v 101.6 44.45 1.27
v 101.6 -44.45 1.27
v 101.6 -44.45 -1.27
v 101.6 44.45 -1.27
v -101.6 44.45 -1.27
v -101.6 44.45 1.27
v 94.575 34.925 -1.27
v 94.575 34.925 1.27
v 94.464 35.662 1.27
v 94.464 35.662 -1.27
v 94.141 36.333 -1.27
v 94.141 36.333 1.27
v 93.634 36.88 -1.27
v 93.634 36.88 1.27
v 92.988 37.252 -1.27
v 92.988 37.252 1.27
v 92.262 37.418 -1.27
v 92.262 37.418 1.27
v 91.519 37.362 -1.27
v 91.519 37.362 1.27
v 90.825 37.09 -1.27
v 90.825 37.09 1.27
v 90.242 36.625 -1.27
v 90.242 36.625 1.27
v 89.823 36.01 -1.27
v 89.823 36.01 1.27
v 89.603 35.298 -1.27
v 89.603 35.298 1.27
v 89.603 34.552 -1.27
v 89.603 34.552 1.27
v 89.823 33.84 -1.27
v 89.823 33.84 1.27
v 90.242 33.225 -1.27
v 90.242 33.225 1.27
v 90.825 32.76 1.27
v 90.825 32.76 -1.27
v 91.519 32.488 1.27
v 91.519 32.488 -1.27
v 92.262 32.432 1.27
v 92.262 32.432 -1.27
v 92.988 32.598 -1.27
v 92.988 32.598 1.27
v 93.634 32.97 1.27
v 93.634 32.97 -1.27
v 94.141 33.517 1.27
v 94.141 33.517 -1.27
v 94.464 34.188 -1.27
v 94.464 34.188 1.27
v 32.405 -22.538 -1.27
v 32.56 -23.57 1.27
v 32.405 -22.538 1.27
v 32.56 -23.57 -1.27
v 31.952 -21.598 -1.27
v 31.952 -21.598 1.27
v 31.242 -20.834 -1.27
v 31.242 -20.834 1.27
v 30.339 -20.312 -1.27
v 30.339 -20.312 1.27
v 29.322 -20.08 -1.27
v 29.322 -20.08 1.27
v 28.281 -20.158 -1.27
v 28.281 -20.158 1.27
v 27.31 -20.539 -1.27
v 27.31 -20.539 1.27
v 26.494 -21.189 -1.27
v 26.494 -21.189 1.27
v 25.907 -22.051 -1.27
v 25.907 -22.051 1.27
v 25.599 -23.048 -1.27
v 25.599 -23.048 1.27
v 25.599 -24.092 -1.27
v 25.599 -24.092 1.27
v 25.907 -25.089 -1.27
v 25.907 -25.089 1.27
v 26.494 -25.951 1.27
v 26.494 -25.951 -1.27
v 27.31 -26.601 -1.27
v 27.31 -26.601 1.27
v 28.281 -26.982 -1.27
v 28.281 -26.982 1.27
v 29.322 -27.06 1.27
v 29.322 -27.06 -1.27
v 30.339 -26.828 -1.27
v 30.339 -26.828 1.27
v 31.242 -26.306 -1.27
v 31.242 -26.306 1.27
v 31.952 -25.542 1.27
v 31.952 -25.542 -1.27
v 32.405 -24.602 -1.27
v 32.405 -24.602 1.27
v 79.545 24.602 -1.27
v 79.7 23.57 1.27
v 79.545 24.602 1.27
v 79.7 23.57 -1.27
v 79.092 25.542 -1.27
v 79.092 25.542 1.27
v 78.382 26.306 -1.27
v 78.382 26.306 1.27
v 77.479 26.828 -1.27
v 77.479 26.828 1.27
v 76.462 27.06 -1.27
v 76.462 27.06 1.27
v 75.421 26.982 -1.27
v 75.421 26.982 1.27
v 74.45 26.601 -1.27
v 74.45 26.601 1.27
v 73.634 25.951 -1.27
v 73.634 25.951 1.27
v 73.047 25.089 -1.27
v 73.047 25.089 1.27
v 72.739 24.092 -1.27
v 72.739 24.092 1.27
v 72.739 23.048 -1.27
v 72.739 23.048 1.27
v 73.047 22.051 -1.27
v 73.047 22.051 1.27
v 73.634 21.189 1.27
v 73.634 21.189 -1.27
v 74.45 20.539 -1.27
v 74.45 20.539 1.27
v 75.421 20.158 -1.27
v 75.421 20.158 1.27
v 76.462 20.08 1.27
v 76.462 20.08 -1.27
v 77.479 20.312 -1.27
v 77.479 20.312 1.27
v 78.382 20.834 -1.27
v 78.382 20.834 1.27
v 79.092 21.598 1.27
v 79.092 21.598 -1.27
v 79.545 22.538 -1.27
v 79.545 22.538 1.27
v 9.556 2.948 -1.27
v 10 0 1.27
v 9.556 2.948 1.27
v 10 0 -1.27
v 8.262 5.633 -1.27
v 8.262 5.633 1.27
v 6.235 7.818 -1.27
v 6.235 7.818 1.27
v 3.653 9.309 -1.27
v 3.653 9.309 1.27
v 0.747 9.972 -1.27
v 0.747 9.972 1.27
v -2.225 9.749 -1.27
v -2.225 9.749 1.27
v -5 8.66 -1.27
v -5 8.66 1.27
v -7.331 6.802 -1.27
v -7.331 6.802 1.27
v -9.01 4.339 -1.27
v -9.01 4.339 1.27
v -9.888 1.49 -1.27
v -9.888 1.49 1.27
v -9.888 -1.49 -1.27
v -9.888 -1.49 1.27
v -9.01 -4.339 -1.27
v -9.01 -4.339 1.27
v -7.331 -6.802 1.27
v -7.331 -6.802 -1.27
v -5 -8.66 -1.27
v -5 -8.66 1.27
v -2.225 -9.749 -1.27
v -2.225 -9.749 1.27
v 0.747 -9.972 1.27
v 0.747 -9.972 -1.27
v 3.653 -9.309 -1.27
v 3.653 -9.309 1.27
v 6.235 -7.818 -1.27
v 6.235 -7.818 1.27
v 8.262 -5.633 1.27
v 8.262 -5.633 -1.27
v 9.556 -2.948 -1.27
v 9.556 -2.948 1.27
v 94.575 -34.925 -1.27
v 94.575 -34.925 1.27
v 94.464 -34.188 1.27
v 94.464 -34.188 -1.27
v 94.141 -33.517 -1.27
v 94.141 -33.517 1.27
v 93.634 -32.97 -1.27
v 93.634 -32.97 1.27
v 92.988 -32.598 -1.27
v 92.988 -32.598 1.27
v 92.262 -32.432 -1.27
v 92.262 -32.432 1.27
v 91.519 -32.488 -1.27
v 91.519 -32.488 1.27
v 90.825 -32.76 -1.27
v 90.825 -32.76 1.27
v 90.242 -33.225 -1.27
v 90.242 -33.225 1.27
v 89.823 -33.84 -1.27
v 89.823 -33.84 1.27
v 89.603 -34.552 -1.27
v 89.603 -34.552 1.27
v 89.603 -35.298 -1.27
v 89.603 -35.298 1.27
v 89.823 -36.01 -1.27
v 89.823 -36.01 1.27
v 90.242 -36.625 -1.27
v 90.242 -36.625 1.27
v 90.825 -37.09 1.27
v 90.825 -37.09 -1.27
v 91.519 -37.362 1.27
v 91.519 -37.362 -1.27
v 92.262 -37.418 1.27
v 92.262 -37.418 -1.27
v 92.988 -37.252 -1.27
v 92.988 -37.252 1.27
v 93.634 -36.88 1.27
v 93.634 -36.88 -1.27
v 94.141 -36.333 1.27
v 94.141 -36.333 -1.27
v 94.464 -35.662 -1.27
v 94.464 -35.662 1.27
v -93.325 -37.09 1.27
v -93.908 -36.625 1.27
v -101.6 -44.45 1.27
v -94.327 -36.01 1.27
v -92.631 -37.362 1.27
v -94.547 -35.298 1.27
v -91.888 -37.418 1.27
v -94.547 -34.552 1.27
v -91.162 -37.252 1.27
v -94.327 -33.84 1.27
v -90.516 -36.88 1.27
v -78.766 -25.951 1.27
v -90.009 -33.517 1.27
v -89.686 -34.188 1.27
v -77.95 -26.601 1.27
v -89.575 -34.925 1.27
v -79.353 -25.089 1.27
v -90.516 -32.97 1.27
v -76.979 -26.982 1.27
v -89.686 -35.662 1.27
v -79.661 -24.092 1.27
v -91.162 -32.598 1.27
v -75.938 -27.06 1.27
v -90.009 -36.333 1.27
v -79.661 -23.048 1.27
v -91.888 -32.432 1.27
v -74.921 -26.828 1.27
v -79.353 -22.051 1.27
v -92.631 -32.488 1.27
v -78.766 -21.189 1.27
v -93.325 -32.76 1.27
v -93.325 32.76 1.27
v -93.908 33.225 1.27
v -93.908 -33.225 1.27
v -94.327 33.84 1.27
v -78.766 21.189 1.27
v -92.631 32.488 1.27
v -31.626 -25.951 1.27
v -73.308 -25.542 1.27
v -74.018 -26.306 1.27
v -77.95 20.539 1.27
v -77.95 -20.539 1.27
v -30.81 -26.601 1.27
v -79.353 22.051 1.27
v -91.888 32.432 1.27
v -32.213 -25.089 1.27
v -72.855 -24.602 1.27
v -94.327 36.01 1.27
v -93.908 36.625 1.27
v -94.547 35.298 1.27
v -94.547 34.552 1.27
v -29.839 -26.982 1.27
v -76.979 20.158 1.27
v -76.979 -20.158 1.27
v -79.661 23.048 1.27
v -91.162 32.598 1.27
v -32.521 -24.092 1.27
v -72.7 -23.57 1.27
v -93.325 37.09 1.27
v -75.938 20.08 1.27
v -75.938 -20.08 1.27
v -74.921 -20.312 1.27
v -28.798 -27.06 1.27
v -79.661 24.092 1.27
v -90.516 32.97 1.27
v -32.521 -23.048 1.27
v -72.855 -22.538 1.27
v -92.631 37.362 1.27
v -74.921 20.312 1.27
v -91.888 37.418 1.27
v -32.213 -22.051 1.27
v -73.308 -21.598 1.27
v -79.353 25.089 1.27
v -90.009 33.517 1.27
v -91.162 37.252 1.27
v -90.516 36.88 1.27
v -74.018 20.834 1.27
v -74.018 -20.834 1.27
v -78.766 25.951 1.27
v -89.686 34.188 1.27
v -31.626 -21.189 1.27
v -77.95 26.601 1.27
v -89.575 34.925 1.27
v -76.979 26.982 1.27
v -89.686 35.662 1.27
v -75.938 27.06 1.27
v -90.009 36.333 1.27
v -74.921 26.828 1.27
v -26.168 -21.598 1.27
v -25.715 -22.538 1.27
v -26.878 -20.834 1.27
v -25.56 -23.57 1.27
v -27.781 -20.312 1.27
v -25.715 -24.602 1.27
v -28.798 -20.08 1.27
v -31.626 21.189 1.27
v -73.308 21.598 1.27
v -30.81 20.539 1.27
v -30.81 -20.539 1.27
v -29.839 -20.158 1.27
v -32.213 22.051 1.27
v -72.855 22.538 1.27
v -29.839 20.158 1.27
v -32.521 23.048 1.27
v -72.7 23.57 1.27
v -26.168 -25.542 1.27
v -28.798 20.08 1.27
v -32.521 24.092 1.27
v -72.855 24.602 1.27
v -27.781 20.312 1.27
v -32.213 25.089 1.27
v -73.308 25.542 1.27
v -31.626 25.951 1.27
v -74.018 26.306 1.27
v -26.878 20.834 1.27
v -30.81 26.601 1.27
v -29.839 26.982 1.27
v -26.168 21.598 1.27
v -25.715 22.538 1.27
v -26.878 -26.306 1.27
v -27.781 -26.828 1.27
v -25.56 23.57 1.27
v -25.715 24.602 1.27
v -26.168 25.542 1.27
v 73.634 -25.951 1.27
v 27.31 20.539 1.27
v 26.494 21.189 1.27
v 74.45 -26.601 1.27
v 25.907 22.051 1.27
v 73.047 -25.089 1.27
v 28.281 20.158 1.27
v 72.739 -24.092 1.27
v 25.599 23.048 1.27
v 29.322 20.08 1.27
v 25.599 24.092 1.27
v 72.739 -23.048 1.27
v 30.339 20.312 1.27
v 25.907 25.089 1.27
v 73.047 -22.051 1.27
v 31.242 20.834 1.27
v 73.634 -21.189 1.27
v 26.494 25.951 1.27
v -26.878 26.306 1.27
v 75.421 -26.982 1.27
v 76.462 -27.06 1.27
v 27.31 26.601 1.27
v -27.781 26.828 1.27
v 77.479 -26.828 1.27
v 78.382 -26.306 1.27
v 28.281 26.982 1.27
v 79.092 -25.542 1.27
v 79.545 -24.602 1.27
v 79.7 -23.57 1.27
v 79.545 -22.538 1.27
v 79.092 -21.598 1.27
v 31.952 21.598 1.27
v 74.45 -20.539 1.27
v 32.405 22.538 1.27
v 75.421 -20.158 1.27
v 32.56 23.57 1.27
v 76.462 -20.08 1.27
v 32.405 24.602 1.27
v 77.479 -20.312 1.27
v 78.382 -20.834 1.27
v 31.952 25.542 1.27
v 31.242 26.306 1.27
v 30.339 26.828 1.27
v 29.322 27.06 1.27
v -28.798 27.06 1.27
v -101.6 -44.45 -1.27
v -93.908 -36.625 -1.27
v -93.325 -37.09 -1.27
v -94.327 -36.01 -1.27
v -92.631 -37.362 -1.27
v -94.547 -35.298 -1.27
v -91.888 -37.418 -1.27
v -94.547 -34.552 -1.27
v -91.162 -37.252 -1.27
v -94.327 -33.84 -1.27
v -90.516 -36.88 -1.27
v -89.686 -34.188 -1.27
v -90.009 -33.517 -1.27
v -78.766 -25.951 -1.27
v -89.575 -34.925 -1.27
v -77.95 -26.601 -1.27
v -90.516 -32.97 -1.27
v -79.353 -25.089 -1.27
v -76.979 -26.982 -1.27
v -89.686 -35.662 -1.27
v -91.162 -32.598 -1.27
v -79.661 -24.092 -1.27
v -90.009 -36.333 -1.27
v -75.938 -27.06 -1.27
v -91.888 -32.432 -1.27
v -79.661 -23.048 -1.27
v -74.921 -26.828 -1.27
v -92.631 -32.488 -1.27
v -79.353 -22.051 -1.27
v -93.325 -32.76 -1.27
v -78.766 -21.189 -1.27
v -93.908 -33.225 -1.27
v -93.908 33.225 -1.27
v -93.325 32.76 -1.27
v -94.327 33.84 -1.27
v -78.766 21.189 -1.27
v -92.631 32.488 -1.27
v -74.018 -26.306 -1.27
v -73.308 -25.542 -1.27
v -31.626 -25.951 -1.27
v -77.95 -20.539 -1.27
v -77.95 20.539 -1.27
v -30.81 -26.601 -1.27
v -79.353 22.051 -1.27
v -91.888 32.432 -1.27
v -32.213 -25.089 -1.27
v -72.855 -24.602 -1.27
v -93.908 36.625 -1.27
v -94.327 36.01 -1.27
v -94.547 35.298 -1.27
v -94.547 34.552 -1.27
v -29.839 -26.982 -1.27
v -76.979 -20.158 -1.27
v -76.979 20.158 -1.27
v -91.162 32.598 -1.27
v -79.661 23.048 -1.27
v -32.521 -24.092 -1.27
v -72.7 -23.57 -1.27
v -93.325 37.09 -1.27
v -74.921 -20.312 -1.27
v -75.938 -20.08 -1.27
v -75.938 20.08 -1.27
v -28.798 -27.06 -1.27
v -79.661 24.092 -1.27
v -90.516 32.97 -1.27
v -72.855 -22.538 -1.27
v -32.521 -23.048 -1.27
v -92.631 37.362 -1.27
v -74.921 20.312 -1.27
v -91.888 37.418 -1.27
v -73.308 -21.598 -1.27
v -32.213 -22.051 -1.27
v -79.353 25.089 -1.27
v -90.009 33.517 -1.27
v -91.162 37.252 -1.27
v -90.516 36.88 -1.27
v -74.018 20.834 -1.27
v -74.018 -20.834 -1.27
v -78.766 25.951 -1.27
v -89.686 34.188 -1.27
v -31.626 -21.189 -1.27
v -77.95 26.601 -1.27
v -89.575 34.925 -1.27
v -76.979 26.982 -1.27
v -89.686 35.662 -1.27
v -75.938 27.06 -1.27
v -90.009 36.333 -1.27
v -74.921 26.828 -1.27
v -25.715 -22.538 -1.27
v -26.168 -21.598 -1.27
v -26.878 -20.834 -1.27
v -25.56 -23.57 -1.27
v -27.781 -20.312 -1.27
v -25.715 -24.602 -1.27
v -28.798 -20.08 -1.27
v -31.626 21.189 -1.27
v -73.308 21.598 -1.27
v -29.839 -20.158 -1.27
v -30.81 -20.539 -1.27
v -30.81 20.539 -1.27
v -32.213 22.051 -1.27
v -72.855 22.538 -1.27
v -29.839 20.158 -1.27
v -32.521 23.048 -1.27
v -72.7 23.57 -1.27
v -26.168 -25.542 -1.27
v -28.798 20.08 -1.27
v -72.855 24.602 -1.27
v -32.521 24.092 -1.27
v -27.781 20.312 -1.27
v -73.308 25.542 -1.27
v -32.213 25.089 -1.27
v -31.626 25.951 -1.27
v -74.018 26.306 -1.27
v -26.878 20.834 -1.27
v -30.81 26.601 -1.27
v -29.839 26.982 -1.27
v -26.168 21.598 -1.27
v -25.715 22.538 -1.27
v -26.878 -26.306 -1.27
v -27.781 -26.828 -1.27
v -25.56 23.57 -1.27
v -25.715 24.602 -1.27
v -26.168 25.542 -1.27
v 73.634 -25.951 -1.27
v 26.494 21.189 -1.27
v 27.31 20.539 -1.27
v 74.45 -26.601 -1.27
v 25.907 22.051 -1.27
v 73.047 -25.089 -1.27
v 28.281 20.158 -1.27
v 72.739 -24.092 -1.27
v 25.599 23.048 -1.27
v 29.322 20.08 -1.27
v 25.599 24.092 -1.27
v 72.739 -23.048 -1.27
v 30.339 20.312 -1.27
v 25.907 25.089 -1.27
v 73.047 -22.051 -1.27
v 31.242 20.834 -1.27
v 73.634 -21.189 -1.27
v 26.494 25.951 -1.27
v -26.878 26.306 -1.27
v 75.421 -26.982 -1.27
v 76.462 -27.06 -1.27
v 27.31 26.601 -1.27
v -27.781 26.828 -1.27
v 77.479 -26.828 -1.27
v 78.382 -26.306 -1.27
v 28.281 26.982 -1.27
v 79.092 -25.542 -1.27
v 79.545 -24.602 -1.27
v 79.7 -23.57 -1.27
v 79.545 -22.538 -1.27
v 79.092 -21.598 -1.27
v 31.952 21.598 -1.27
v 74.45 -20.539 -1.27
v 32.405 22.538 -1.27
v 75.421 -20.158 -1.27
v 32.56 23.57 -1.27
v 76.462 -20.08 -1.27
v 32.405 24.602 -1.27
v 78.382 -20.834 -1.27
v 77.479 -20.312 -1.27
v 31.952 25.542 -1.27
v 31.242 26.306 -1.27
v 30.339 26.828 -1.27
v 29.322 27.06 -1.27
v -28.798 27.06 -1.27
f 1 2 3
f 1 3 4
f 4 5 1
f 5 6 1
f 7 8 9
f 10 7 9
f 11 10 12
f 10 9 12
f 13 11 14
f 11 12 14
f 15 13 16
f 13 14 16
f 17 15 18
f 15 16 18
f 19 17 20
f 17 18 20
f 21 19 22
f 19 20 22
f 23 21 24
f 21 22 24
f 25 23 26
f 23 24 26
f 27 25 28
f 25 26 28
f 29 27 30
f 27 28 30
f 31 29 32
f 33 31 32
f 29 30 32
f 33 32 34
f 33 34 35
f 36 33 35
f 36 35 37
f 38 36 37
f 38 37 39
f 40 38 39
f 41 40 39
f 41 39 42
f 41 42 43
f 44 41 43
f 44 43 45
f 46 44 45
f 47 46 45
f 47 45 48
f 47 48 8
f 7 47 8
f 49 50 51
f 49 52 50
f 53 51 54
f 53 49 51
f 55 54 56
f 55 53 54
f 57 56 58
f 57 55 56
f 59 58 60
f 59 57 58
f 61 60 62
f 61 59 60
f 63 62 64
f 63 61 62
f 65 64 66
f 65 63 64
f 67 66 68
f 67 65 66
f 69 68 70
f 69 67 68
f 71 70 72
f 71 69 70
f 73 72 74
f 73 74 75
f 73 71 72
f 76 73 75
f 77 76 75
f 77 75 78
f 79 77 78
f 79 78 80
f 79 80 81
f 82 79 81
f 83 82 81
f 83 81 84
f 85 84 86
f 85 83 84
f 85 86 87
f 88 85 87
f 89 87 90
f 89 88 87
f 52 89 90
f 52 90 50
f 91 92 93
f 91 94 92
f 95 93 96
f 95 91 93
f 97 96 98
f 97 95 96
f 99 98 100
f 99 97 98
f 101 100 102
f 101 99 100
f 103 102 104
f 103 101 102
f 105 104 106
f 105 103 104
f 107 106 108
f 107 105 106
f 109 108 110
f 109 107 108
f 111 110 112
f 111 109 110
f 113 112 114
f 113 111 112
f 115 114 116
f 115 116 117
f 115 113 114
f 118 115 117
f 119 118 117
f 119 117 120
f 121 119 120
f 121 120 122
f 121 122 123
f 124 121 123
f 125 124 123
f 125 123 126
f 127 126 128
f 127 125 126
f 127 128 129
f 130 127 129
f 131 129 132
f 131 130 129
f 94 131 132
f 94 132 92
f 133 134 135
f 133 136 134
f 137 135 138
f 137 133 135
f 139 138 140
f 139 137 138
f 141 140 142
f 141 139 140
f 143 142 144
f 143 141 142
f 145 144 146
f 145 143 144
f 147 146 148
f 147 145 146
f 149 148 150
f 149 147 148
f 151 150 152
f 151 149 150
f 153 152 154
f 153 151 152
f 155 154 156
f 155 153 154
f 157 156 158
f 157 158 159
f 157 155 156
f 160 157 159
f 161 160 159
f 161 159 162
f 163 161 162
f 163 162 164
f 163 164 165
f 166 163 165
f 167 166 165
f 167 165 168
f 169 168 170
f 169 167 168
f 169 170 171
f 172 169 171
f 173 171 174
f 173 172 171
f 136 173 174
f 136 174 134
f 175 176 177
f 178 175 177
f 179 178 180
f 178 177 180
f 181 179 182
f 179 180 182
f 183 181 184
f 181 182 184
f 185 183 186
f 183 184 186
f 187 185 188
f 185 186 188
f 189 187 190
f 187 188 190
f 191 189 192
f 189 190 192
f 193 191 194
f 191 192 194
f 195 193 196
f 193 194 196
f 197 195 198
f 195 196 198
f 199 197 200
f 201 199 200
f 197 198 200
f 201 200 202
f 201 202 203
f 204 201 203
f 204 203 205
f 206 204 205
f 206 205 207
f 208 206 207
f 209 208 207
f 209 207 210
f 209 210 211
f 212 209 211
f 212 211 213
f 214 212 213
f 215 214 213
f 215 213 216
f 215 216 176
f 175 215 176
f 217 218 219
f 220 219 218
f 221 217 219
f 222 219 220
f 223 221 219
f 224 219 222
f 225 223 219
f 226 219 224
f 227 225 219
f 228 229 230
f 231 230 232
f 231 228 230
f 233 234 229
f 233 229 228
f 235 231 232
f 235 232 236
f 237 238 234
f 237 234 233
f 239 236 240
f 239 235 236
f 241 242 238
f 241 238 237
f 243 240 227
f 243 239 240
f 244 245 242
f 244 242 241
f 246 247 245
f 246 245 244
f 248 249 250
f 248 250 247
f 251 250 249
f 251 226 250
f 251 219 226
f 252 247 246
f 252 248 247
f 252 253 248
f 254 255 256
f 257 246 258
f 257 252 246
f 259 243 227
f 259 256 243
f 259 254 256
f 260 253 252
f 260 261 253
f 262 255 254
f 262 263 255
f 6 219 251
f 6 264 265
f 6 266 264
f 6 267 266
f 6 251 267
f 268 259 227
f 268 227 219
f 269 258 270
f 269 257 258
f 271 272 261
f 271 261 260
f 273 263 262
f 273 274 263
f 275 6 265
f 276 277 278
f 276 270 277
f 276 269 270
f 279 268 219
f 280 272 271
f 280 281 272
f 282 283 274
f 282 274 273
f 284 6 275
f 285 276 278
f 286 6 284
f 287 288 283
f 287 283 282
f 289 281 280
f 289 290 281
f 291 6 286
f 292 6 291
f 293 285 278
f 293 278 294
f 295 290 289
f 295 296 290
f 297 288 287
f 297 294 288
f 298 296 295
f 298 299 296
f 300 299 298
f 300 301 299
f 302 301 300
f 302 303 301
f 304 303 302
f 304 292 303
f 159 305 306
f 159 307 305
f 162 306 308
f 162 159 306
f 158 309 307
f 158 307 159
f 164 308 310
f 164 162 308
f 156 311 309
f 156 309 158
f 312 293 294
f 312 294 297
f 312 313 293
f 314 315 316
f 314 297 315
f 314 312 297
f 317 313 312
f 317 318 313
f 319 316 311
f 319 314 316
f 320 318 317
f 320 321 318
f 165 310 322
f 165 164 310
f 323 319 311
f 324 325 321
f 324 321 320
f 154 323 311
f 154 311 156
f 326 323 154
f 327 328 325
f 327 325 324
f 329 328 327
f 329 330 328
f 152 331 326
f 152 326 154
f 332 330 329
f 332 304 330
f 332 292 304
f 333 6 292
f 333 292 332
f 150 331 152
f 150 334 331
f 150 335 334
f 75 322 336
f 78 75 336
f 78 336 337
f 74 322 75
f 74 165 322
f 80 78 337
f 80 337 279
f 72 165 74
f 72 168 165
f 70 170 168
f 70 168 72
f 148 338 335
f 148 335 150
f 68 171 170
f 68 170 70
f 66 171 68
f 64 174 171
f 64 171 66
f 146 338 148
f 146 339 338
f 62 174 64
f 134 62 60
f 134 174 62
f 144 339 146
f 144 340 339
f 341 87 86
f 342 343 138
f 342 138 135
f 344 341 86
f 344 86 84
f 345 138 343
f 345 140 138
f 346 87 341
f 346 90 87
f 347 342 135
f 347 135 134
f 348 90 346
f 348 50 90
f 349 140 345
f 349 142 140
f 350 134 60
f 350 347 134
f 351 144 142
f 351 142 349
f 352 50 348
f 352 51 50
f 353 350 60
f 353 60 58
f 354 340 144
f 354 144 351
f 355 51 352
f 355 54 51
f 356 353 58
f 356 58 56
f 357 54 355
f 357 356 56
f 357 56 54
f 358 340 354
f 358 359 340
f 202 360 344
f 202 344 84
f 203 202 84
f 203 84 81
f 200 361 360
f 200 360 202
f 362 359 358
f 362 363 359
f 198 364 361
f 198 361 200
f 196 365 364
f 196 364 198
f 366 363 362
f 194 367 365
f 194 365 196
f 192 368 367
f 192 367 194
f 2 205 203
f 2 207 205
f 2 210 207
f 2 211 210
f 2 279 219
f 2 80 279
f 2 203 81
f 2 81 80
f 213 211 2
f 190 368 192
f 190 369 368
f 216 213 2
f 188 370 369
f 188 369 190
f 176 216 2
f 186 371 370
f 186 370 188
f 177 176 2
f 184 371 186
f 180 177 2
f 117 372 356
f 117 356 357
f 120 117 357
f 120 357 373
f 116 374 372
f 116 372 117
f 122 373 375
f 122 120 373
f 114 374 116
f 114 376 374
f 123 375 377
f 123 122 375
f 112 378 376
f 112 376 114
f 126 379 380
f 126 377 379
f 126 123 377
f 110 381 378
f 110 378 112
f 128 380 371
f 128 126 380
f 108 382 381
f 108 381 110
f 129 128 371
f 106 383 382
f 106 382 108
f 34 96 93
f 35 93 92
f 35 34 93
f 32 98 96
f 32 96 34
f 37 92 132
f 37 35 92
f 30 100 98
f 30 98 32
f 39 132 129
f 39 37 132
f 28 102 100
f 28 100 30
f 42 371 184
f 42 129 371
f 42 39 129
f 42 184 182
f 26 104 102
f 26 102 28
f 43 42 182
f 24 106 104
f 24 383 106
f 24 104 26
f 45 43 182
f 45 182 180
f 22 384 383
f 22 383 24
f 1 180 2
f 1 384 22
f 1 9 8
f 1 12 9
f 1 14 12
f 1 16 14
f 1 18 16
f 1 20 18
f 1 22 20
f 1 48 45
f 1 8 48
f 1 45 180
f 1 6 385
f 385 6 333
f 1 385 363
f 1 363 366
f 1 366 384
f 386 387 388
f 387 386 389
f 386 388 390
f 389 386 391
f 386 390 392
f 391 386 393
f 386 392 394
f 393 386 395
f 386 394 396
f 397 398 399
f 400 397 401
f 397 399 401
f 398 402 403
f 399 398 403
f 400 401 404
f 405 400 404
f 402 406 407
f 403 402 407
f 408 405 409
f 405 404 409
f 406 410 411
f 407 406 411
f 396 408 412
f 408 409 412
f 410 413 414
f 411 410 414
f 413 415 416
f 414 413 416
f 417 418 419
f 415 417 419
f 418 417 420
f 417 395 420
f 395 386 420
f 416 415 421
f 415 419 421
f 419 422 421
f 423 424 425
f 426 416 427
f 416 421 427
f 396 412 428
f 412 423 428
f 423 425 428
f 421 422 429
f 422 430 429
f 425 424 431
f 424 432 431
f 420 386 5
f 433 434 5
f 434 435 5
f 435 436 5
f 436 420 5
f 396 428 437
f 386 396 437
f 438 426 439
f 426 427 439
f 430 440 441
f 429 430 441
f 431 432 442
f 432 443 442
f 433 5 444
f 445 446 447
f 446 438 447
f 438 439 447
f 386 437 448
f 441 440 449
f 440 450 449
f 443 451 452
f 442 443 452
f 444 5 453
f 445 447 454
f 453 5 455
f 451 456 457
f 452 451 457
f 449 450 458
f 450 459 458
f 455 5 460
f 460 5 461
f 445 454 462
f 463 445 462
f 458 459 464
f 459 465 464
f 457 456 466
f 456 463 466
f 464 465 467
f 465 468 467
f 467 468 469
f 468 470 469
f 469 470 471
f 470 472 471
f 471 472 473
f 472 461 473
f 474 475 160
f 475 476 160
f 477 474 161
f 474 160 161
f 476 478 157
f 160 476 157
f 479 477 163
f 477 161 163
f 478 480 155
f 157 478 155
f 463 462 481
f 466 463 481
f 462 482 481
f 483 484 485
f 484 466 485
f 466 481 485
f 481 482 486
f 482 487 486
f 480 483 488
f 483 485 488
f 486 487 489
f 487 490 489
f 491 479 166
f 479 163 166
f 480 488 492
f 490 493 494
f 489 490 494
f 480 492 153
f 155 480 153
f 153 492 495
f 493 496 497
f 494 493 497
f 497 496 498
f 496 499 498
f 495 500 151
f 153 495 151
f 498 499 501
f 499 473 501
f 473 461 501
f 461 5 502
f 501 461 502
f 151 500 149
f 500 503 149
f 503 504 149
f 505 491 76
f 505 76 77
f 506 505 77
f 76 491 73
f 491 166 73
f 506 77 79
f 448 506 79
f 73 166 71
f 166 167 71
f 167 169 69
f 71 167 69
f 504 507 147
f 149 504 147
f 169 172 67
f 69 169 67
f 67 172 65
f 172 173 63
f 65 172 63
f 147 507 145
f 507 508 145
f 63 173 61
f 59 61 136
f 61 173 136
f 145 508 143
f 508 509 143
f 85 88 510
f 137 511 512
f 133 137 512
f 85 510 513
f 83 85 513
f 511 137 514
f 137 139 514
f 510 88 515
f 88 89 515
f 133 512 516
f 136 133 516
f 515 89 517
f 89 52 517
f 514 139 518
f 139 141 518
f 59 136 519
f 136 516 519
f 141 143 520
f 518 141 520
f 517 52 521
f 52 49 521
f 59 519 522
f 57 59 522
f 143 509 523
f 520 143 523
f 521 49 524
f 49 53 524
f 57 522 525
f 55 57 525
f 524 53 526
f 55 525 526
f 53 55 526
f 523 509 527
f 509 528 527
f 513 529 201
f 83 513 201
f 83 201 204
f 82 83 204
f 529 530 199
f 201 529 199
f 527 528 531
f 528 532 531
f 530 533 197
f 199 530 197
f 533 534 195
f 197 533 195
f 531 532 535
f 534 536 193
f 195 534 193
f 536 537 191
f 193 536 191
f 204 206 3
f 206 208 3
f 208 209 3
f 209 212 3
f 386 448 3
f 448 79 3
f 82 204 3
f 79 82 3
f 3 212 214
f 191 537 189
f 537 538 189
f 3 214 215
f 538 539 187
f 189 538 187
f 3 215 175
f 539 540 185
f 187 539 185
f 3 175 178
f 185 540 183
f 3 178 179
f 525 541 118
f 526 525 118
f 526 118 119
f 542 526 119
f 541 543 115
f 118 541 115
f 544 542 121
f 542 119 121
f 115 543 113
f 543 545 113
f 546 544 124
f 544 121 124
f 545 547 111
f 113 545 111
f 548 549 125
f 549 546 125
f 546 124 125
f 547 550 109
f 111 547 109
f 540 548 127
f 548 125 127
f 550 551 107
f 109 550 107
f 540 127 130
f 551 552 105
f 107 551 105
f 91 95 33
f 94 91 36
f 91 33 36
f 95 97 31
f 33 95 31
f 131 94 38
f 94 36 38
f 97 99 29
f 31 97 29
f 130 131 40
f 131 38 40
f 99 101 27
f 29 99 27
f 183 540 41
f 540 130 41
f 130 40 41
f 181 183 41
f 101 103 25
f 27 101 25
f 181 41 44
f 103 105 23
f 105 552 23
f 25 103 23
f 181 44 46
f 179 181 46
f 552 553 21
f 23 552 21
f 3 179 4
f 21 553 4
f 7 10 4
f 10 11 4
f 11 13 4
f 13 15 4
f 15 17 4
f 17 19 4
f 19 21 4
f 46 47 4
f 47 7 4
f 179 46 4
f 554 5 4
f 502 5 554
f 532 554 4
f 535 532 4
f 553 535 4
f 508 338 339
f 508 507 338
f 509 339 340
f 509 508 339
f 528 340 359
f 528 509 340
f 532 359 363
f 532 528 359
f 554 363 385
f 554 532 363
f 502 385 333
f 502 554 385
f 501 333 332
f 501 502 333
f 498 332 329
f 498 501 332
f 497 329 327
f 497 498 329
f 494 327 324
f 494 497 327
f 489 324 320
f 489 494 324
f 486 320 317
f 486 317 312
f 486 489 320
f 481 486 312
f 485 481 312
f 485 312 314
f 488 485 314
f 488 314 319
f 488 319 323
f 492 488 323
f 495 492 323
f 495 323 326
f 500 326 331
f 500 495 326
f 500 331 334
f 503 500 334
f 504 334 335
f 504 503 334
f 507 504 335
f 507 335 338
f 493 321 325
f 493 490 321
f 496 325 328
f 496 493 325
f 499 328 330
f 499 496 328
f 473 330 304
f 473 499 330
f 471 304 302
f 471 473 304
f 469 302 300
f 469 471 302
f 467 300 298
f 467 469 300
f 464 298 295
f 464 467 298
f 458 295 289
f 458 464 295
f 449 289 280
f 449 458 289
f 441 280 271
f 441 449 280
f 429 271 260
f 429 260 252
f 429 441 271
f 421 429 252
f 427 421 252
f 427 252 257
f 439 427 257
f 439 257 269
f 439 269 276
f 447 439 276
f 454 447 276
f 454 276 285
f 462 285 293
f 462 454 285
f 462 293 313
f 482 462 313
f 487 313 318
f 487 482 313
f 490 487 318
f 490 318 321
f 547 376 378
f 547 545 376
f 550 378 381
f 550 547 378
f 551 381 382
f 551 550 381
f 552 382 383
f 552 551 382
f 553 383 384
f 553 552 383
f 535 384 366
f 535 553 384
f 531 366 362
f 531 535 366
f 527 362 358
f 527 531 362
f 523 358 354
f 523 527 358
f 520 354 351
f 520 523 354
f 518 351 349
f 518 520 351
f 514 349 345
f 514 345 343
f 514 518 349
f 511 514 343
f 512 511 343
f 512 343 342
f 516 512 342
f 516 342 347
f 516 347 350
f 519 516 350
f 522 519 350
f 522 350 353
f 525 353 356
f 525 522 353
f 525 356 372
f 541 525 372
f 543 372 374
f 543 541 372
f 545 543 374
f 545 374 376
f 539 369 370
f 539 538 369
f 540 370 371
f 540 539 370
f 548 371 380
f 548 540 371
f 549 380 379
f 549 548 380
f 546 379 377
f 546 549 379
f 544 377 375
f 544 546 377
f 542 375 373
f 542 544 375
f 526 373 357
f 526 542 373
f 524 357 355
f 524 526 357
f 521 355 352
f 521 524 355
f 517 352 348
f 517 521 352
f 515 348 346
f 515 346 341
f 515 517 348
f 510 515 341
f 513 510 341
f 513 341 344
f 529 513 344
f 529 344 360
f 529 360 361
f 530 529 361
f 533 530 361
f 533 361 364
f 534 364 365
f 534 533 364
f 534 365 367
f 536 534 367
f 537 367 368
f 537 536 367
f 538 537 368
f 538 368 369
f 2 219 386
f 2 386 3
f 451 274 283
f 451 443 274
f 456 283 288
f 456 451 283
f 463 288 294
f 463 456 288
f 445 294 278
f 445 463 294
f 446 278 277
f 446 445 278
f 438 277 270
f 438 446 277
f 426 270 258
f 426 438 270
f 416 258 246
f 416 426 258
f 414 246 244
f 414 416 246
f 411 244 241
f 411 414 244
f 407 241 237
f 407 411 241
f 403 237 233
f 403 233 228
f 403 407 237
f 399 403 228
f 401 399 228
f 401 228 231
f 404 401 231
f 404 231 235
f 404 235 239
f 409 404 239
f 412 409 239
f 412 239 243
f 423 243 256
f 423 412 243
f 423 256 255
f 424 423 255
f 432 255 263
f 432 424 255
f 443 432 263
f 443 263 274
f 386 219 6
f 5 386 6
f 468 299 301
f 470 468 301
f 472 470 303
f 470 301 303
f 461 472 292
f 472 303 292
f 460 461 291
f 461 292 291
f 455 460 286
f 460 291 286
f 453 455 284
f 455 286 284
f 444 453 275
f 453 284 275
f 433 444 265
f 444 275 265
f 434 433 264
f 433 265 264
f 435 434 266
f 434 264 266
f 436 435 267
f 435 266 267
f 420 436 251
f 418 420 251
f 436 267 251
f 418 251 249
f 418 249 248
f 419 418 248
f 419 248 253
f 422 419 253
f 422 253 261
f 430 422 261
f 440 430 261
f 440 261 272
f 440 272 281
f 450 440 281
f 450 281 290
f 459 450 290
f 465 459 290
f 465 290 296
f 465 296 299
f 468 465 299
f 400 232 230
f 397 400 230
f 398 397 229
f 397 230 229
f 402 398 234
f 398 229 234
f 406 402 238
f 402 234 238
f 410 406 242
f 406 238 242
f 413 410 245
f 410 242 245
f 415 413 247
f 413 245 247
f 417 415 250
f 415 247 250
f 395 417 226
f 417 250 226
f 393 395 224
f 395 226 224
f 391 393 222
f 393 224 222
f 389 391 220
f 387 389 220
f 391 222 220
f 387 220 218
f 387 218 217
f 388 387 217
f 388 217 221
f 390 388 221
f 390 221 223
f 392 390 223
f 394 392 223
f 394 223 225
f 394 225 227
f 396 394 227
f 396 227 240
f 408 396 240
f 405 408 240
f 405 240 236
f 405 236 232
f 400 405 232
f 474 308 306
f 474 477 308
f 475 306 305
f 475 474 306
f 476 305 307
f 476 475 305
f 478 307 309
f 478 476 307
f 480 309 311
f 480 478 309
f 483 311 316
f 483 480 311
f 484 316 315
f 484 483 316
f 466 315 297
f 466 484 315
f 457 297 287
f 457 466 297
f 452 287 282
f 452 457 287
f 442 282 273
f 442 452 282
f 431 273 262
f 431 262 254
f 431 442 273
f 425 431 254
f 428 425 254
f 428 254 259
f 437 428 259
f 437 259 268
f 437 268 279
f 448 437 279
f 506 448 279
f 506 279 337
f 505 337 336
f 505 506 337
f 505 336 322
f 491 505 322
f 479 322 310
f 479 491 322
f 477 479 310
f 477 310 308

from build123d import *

# Parameters (mm, degrees)
SKETCH2_W           = 203.2
SKETCH2_H           = 88.9
SKETCH2_R           = 3.5
SKETCH2_R_2         = 10
BOSS_EXTRUDE1_DEPTH = 1.27
SKETCH3_R           = 2.5
CUT_EXTRUDE1_DEPTH  = 111.92706658


with BuildPart() as part:
    # Sketch2 → Boss-Extrude1 (new, symmetric)
    with BuildSketch(Plane.XY):
        Rectangle(SKETCH2_W, SKETCH2_H)
        with Locations((-76.2, 23.57)):
            Circle(SKETCH2_R, mode=Mode.SUBTRACT)
        with Locations((-29.06, 23.57)):
            Circle(SKETCH2_R, mode=Mode.SUBTRACT)
        with Locations((-29.06, -23.57)):
            Circle(SKETCH2_R, mode=Mode.SUBTRACT)
        with Locations((-76.2, -23.57)):
            Circle(SKETCH2_R, mode=Mode.SUBTRACT)
        with Locations((29.06, -23.57)):
            Circle(SKETCH2_R, mode=Mode.SUBTRACT)
        with Locations((76.2, -23.57)):
            Circle(SKETCH2_R, mode=Mode.SUBTRACT)
        with Locations((76.2, 23.57)):
            Circle(SKETCH2_R, mode=Mode.SUBTRACT)
        with Locations((29.06, 23.57)):
            Circle(SKETCH2_R, mode=Mode.SUBTRACT)
        Circle(SKETCH2_R_2, mode=Mode.SUBTRACT)
    extrude(amount=BOSS_EXTRUDE1_DEPTH, both=True)

    # Sketch3 → Cut-Extrude1 (cut, through all)
    with BuildSketch(Plane.XY.offset(1.27)):
        with Locations((-92.075, 34.925)):
            Circle(SKETCH3_R)
        with Locations((-92.075, -34.925)):
            Circle(SKETCH3_R)
        with Locations((92.075, -34.925)):
            Circle(SKETCH3_R)
        with Locations((92.075, 34.925)):
            Circle(SKETCH3_R)
    extrude(amount=-CUT_EXTRUDE1_DEPTH, mode=Mode.SUBTRACT)


solid = part.part
